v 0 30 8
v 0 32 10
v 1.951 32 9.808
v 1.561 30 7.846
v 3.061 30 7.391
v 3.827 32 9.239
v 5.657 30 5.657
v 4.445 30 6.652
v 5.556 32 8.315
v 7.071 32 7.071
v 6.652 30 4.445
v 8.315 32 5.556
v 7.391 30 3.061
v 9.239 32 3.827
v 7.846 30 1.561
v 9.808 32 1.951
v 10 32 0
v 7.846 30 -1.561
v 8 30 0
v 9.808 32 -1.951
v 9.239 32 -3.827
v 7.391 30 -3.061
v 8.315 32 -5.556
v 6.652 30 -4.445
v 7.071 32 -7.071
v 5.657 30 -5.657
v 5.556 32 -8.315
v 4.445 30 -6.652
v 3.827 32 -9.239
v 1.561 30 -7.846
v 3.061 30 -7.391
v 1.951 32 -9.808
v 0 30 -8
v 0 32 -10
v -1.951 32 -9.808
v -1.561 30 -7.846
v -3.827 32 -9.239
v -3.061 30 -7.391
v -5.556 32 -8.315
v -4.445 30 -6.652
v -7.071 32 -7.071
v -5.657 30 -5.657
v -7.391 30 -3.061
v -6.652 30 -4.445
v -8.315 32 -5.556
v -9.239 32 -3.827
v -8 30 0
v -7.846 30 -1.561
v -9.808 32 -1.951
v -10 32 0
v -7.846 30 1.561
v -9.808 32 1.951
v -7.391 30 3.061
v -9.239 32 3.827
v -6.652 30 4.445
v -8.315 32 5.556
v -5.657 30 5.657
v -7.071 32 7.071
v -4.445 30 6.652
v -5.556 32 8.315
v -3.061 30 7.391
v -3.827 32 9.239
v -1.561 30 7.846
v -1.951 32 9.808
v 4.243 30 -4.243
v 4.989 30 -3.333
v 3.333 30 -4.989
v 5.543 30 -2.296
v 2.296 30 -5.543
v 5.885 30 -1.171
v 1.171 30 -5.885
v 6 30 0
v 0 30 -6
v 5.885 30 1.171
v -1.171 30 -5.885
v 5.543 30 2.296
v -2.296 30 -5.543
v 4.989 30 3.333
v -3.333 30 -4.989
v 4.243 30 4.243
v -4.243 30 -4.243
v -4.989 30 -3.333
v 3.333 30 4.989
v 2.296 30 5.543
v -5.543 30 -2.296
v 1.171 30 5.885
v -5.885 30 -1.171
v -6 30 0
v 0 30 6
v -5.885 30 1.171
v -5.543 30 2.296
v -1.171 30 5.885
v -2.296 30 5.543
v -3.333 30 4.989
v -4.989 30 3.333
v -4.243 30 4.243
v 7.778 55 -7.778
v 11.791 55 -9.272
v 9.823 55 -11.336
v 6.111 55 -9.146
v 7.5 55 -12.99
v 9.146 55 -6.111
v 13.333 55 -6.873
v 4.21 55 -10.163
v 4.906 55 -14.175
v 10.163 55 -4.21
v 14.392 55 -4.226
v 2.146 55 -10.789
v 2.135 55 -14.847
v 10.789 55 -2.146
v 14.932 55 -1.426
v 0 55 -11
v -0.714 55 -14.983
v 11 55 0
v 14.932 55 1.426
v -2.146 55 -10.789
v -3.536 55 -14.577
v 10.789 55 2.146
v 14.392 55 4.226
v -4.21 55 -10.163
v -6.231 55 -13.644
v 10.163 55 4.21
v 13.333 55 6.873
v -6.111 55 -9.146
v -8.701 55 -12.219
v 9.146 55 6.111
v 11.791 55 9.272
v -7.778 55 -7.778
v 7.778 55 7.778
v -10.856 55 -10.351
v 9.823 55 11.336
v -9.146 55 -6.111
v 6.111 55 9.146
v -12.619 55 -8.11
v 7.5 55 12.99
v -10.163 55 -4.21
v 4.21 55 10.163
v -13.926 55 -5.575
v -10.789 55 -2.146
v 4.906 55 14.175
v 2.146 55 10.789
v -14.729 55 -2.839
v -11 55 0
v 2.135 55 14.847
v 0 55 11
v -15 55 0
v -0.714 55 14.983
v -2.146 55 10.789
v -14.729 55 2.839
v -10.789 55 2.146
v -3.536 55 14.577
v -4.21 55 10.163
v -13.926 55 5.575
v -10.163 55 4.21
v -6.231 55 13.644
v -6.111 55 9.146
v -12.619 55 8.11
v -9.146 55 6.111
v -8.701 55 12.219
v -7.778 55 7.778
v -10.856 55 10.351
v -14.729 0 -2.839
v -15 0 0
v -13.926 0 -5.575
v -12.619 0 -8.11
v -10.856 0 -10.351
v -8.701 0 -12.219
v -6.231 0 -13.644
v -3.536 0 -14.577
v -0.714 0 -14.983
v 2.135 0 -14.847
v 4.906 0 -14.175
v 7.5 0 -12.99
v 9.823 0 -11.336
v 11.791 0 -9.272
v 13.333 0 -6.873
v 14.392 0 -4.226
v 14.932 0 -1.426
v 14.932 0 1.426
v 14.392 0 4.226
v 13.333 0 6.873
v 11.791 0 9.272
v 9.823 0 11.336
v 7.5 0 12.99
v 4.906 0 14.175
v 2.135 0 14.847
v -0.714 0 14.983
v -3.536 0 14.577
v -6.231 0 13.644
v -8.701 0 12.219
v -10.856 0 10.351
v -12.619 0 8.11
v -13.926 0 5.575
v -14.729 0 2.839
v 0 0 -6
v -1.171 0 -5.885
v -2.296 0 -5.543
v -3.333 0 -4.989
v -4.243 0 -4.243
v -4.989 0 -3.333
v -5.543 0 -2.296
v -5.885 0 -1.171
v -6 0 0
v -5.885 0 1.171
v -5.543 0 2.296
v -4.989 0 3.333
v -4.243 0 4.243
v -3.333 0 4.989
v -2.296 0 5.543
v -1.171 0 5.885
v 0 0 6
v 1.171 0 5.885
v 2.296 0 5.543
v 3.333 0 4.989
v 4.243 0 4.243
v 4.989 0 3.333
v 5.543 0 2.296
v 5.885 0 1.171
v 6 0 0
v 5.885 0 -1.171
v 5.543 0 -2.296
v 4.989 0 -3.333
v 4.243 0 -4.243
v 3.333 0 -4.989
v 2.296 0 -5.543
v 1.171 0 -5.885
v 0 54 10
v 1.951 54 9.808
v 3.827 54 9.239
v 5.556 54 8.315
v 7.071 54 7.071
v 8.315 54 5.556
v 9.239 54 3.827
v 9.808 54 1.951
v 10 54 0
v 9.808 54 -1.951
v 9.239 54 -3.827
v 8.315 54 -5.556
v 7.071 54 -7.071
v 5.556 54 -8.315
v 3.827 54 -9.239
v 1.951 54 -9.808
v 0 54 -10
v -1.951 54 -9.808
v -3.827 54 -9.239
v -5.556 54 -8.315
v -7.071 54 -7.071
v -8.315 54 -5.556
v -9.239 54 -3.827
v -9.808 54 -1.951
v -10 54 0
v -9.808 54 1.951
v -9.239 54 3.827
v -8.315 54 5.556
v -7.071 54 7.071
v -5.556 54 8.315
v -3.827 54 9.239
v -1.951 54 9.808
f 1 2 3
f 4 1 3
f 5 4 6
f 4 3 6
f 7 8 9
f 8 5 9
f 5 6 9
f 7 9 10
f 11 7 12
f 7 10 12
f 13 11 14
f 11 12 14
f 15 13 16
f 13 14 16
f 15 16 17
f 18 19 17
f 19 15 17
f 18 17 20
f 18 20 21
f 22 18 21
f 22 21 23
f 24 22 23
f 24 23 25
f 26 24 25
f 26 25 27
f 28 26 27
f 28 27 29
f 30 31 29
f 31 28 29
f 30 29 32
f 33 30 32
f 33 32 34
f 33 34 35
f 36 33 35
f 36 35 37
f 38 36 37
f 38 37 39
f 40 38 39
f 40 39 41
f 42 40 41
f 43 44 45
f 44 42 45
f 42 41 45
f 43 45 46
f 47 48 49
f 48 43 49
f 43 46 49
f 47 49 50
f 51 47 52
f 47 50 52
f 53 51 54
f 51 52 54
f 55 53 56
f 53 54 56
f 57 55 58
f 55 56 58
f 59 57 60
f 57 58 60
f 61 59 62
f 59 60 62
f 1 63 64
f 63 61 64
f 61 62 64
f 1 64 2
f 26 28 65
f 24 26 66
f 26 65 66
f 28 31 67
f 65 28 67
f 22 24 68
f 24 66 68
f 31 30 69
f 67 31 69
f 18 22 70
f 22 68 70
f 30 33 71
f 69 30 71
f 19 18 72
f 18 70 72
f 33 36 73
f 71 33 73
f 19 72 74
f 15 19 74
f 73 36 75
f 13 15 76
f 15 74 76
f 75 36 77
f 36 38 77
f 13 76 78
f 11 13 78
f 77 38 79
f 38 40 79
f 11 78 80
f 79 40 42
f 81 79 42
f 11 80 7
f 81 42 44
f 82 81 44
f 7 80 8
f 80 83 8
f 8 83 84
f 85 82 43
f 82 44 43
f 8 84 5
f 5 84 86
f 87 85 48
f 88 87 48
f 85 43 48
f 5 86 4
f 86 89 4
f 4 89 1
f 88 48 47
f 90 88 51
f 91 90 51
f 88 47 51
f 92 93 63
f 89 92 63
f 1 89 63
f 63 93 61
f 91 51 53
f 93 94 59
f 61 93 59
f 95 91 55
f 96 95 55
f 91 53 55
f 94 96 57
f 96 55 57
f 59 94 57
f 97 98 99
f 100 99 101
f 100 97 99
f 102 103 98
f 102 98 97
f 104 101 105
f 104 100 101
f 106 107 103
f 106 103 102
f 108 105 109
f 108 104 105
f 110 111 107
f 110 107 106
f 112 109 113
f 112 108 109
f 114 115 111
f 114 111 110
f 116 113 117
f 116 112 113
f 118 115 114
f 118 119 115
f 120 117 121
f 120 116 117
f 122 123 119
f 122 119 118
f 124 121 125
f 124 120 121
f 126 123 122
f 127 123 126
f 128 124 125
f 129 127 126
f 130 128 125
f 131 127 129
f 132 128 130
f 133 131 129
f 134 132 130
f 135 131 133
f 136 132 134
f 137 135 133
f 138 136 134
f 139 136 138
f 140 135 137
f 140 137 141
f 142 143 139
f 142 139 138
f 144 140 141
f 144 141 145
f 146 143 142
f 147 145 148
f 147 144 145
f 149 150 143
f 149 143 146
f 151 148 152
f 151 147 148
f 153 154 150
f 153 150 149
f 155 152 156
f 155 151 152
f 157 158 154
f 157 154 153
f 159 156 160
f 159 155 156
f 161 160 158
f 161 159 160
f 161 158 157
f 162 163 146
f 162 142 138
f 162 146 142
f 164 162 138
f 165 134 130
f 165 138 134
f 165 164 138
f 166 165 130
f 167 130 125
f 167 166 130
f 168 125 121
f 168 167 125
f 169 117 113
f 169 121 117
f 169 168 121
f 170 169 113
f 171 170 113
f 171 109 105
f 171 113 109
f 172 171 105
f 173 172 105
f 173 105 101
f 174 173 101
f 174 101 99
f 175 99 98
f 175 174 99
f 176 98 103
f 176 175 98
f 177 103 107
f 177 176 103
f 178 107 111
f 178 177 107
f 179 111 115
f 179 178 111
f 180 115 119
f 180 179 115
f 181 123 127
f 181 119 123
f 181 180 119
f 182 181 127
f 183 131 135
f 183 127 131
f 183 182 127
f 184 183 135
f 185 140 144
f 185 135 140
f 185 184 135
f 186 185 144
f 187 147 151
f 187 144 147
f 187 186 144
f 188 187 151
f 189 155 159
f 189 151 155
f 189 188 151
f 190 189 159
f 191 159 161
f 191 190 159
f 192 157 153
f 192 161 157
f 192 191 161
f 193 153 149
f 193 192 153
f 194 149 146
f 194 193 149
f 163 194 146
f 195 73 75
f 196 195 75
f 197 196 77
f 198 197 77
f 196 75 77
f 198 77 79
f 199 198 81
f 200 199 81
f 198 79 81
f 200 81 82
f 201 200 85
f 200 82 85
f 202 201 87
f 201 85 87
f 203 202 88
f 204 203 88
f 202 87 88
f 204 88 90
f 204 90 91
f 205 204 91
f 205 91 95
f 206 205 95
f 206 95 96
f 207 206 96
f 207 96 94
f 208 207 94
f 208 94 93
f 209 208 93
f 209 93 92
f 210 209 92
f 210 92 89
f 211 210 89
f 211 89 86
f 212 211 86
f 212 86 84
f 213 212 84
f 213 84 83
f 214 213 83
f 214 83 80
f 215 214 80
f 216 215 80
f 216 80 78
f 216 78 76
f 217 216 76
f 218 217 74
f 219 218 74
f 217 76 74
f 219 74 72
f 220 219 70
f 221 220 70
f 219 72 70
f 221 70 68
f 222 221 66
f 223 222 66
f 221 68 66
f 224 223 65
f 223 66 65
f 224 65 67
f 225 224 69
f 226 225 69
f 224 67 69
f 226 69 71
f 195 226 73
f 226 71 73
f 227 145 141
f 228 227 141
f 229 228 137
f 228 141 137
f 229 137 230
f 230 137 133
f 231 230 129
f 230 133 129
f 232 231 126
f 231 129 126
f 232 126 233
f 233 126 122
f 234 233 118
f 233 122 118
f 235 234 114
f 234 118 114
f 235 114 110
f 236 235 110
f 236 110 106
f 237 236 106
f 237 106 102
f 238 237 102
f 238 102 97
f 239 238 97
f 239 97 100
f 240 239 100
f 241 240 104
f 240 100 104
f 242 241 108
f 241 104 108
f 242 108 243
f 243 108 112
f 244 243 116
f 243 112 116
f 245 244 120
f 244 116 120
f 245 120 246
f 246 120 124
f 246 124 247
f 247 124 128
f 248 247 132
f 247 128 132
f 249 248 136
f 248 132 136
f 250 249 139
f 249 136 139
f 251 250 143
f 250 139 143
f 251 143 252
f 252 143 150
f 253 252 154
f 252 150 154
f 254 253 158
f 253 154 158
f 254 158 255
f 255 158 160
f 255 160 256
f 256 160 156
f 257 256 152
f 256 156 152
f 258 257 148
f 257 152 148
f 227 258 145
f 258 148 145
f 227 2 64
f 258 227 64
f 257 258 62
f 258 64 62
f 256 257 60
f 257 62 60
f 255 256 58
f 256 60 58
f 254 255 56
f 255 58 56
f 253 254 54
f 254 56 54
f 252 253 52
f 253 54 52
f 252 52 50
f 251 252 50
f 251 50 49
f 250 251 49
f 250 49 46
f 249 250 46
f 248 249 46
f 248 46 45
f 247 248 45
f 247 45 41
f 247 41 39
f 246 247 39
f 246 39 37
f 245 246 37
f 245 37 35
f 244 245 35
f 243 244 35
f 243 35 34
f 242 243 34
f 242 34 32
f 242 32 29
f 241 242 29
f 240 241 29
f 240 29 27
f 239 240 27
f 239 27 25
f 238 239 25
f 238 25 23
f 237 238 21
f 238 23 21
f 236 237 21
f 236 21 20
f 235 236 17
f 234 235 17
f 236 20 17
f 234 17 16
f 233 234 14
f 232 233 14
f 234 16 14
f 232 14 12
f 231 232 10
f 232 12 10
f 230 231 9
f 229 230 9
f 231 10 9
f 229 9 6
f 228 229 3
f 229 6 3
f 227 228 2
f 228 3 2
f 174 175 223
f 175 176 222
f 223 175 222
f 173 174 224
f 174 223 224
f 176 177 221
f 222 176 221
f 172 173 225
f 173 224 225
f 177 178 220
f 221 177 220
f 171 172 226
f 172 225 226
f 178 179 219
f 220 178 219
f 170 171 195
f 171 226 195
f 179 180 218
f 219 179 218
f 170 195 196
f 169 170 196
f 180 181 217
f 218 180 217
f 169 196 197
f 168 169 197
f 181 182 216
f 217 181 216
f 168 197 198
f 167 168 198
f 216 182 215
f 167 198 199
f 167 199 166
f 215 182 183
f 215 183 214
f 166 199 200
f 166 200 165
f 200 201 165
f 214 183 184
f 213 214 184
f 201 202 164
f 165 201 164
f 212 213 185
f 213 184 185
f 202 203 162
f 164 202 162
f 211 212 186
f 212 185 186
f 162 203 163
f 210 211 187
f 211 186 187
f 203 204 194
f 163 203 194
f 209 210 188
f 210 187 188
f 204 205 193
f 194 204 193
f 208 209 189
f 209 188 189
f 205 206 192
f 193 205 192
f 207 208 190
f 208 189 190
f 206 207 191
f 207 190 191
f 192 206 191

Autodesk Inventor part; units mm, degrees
ref_plane "YZ Plane" through (0, 0, 0) normal (1, 0, 0) x (0, 1, 0)
ref_plane "XZ Plane" through (0, 0, 0) normal (0, 1, 0) x (-1, 0, 0)
ref_plane "XY Plane" through (0, 0, 0) normal (0, 0, 1) x (1, 0, 0)
sketch "Эскиз1" plane through (0, 0, 0) normal (0, 1, 0) x (-1, 0, 0)
  circle A0 centre (0, 0) radius 15
  dimension "d0" = 30
extrude "Выдавливание1" add sketch "Эскиз1" along normal blind 55
hole "Отверстие1" at (0, 55, 0) direction (0, -1, 0) diameter 20 depth 25
hole "Отверстие2" at (0, 0, 0) direction (0, 1, 0) diameter 12 depth 30
thread "Резьба1" size "M20x2.5" class "6H" standard "ANSI Metric M Profile" length 20
chamfer "Фаска1" distance 2 angle 45 1 edges at (0, 30, -10)
chamfer "Фаска2" distance 1 angle 45 1 edges at (0, 55, -10)
equation "\"Радиус_гибки\" = Толщина"
equation "\"Ширина_просечки\" = Толщина"
equation "\"Глубина_просечки\" = 0.5 * Толщина"
equation "\"Размер_просечки\" = 4 * Толщина"
equation "\"Мин_остаток\" = 2 * Толщина"
equation "\"Радиус_перехода\" = Радиус_гибки"
equation "\"Радиус_Якоби\" = Толщина"
equation "\"Размер_зазора\" = Толщина"
equation "\"Толщина\" = 3.048"
properties part number "778" material "Сталь, углеродистая"
